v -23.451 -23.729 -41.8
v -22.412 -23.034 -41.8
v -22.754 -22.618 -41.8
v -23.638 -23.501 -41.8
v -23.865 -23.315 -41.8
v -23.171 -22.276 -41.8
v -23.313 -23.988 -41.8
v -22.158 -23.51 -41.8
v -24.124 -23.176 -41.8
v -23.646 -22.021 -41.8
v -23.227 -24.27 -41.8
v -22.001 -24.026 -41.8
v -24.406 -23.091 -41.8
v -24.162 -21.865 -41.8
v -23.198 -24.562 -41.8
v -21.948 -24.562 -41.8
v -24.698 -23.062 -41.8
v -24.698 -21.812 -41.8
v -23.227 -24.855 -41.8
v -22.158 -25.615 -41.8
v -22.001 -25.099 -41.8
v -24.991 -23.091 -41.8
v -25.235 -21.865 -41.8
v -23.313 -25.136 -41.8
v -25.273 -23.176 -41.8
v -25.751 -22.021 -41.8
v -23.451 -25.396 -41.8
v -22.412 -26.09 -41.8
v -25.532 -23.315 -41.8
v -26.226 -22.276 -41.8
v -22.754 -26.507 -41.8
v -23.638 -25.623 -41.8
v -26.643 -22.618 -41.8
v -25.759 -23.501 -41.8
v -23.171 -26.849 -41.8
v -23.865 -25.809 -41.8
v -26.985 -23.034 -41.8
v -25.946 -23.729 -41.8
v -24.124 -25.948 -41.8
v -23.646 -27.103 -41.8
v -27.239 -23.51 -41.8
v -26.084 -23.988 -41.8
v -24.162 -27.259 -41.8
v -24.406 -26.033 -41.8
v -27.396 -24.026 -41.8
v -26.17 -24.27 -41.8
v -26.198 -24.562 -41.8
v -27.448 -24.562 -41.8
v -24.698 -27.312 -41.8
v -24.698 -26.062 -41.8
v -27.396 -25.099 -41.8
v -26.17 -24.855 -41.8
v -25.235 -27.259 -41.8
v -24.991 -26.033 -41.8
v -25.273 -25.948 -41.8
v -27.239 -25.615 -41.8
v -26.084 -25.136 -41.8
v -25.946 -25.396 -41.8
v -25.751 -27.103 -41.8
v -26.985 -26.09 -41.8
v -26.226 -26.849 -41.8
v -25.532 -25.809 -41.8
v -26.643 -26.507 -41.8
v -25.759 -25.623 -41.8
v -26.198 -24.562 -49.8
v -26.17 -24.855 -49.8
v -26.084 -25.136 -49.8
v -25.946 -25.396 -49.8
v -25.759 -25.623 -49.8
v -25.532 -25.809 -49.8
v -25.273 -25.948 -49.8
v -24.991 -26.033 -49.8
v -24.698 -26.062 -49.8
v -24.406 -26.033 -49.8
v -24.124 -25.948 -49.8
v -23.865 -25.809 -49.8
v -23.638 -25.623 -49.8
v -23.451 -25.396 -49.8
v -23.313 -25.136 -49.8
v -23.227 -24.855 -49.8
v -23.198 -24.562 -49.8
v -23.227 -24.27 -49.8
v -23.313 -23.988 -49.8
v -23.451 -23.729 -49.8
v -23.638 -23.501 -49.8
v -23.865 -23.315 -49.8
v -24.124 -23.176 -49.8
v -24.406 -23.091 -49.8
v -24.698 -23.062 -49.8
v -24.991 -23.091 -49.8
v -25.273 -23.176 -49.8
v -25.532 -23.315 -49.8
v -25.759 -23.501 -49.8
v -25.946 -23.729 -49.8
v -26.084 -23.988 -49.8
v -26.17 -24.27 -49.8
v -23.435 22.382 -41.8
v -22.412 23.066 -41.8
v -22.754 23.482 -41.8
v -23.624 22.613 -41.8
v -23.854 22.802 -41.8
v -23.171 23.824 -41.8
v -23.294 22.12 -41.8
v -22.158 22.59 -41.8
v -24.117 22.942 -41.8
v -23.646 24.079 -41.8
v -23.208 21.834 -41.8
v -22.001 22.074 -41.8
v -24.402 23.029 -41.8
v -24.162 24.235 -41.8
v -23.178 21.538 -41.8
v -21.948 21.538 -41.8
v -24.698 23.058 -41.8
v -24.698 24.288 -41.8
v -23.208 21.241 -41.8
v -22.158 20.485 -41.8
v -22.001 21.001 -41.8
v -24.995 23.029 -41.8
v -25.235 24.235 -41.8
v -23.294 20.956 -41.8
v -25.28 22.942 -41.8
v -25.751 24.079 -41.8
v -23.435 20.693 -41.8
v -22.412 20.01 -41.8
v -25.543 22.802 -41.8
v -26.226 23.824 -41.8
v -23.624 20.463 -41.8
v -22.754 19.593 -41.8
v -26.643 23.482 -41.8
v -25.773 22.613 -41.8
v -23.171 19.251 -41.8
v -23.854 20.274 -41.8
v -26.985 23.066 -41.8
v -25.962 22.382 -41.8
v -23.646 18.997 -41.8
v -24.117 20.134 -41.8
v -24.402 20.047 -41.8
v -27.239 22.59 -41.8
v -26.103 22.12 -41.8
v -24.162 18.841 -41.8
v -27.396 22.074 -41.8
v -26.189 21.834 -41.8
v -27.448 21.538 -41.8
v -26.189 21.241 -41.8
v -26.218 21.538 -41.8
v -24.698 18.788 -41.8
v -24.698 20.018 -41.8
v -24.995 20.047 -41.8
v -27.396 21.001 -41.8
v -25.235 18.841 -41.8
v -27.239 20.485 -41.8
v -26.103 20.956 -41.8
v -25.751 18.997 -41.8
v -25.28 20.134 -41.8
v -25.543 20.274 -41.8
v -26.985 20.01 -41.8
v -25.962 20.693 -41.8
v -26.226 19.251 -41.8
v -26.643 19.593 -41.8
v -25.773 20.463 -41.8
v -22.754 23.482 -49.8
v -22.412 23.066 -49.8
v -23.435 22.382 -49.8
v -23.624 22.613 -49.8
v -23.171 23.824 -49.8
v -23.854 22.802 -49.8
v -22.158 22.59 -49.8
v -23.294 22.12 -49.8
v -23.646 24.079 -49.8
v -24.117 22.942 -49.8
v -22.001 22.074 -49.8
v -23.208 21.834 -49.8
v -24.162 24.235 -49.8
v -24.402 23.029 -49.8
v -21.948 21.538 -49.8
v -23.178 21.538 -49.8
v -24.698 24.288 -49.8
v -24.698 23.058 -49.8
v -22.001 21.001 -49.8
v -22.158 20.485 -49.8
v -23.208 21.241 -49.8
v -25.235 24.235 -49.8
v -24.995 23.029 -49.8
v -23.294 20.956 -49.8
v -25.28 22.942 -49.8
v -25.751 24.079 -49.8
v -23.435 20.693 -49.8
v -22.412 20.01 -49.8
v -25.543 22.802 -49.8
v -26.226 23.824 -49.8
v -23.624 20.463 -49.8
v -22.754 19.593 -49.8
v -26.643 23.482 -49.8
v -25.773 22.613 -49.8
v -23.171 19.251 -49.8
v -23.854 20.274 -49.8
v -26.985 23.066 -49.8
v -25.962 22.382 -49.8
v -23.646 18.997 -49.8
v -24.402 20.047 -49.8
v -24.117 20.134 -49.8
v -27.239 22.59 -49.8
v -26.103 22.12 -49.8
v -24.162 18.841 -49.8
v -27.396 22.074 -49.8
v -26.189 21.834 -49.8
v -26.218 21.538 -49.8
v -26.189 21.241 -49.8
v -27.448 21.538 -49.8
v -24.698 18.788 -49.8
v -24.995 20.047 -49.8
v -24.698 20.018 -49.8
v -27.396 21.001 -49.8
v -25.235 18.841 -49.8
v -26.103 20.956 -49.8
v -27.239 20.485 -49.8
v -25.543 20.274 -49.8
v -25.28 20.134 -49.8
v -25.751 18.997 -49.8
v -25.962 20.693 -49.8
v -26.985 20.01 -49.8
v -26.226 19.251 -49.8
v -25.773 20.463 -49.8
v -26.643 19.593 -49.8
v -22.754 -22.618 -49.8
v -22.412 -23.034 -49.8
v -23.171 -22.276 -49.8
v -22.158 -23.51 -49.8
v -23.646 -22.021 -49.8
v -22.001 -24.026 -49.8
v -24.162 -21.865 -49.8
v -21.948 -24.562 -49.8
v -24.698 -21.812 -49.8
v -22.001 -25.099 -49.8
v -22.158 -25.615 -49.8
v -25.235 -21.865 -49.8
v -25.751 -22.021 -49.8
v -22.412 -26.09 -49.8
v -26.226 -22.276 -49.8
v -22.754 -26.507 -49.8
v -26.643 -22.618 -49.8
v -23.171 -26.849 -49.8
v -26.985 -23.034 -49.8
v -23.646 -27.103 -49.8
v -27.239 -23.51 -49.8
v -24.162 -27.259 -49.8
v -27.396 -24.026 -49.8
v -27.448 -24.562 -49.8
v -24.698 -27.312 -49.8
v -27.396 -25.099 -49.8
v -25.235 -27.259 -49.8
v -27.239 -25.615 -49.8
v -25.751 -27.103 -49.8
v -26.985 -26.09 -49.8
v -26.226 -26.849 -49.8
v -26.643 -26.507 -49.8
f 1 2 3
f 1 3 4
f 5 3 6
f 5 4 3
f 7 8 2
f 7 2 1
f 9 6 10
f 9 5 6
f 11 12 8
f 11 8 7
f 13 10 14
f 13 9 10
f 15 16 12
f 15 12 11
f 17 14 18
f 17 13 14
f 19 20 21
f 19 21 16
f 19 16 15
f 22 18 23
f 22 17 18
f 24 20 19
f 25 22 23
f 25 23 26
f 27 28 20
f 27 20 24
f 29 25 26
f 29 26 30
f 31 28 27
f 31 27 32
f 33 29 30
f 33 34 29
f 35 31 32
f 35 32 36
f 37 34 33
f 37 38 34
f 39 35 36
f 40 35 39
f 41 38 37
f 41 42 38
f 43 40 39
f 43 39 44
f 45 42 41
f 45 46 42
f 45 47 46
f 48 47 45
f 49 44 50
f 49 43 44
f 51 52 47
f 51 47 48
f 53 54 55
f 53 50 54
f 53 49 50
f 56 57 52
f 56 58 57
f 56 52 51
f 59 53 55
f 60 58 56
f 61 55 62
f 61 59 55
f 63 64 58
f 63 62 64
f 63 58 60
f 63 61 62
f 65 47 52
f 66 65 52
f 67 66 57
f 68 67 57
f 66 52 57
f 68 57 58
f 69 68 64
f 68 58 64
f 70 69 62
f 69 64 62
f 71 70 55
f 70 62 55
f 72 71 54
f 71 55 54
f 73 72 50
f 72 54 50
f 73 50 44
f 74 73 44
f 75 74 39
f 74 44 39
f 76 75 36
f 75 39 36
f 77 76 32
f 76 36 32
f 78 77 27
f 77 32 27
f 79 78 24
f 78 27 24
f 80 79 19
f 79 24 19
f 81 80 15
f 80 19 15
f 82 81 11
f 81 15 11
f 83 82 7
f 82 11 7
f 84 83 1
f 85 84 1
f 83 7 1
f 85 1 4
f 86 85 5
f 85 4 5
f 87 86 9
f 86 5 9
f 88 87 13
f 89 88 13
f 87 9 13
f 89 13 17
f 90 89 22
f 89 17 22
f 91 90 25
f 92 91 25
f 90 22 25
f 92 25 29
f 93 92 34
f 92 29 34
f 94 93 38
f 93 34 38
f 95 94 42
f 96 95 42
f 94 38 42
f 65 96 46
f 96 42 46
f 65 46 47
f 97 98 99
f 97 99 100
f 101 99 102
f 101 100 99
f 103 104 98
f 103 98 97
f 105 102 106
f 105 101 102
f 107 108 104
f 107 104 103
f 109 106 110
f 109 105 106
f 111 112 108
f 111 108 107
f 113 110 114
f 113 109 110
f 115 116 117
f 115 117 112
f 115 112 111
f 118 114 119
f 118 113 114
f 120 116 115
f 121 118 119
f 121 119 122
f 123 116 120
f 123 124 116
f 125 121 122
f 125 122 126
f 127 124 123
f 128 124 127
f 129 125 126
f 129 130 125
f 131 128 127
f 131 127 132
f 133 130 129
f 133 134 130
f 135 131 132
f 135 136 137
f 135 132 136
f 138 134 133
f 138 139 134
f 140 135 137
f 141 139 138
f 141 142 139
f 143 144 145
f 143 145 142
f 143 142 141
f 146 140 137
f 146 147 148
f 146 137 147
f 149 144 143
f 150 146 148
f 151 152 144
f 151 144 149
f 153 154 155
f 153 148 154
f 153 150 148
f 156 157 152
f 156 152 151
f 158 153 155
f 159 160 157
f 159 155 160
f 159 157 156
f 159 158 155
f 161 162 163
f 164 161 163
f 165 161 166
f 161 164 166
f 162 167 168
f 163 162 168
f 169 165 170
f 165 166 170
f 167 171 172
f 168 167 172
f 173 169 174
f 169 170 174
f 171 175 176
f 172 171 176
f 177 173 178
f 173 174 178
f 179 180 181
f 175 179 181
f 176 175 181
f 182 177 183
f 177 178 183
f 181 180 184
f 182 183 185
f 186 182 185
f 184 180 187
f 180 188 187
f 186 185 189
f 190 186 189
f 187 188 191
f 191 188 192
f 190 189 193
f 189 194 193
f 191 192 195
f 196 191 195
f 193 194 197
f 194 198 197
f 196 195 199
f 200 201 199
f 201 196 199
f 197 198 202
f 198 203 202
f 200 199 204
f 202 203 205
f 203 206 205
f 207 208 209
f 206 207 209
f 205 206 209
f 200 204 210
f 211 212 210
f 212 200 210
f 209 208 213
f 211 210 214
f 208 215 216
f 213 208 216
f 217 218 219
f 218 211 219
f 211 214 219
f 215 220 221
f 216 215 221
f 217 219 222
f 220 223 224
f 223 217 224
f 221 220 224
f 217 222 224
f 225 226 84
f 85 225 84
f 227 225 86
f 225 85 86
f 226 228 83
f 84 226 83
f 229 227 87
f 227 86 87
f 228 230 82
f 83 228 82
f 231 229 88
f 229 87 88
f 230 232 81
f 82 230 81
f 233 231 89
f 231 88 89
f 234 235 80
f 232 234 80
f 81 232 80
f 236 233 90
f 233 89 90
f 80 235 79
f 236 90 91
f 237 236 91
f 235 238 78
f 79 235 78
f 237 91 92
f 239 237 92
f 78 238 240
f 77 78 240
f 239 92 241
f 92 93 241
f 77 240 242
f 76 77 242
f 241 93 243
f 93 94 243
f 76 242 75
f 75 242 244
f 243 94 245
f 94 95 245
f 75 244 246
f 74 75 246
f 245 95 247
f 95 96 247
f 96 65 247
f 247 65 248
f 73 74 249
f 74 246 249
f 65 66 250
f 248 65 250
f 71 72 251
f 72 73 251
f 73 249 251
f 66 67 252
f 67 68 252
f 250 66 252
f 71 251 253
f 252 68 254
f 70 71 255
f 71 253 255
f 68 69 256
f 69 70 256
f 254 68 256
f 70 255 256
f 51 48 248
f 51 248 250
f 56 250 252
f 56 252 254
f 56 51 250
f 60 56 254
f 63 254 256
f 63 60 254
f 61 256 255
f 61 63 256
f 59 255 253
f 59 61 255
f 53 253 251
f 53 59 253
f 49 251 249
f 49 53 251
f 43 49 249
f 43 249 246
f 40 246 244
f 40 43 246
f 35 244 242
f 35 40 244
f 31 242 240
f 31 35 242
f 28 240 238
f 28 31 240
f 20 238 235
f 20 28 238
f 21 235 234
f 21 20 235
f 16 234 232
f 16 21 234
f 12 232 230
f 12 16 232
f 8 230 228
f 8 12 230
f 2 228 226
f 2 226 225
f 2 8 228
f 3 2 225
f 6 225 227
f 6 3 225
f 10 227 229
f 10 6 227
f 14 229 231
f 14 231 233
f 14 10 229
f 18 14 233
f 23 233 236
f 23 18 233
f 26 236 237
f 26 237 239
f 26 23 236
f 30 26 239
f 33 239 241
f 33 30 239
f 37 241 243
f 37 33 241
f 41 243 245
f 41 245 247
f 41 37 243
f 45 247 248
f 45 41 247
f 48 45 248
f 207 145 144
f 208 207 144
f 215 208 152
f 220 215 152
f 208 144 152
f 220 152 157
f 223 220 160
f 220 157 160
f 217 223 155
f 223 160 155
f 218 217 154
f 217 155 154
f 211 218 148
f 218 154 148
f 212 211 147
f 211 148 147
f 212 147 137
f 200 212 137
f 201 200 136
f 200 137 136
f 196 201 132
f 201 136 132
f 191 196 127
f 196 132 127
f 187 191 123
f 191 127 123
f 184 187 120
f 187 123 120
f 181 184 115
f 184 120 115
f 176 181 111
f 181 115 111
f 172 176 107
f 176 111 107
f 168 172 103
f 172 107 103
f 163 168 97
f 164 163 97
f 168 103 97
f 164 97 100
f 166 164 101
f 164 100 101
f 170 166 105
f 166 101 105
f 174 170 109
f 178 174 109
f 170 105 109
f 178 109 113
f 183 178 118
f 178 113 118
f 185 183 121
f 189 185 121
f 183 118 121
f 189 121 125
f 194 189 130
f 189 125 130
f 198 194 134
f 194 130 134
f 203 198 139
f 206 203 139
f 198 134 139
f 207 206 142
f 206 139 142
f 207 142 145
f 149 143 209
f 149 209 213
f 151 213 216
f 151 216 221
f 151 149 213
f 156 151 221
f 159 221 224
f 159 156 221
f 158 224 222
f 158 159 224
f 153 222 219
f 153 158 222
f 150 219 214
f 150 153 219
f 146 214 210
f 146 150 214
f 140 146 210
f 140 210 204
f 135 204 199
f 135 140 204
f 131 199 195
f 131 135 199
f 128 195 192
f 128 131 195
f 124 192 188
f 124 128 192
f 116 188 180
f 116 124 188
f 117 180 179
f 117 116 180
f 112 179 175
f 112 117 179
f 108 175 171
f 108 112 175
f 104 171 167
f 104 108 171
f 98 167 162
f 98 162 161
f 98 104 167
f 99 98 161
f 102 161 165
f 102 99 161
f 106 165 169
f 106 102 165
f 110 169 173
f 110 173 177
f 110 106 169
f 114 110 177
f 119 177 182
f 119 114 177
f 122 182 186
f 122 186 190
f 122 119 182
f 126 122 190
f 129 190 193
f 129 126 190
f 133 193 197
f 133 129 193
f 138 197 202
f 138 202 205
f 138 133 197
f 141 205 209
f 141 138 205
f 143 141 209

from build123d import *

# Parameters (mm, degrees)
EXTRUDE_START     = -41.800416
SKETCH_1_R        = 2.75
SKETCH_1_R_2      = 1.52
EXTRUDE_1_DEPTH   = 8
SKETCH_1_R_3      = 1.5
EXTRUDE_1_2_DEPTH = 8


with BuildPart() as part:
    # 草图1 → 凸台-拉伸1 (new body)
    with BuildSketch(Plane.XY.offset(EXTRUDE_START)):
        with Locations(Location((-24.698490112, 21.537847164, 0), (0, 0, 180))):
            Circle(SKETCH_1_R)
        with Locations(Location((-24.698490112, 21.537847164, 0), (0, 0, 180))):
            Circle(SKETCH_1_R_2, mode=Mode.SUBTRACT)
    extrude(amount=-EXTRUDE_1_DEPTH)


with BuildPart() as body_2:
    # 草图1 → Extrude 1 2 (new body)
    with BuildSketch(Plane.XY.offset(EXTRUDE_START)):
        with Locations(Location((-24.698490112, -24.562152076, 0), (0, 0, 180))):
            Circle(SKETCH_1_R)
        with Locations(Location((-24.698490112, -24.562152076, 0), (0, 0, 180))):
            Circle(SKETCH_1_R_3, mode=Mode.SUBTRACT)
    extrude(amount=-EXTRUDE_1_2_DEPTH)


solid = Compound([part.part, body_2.part])
